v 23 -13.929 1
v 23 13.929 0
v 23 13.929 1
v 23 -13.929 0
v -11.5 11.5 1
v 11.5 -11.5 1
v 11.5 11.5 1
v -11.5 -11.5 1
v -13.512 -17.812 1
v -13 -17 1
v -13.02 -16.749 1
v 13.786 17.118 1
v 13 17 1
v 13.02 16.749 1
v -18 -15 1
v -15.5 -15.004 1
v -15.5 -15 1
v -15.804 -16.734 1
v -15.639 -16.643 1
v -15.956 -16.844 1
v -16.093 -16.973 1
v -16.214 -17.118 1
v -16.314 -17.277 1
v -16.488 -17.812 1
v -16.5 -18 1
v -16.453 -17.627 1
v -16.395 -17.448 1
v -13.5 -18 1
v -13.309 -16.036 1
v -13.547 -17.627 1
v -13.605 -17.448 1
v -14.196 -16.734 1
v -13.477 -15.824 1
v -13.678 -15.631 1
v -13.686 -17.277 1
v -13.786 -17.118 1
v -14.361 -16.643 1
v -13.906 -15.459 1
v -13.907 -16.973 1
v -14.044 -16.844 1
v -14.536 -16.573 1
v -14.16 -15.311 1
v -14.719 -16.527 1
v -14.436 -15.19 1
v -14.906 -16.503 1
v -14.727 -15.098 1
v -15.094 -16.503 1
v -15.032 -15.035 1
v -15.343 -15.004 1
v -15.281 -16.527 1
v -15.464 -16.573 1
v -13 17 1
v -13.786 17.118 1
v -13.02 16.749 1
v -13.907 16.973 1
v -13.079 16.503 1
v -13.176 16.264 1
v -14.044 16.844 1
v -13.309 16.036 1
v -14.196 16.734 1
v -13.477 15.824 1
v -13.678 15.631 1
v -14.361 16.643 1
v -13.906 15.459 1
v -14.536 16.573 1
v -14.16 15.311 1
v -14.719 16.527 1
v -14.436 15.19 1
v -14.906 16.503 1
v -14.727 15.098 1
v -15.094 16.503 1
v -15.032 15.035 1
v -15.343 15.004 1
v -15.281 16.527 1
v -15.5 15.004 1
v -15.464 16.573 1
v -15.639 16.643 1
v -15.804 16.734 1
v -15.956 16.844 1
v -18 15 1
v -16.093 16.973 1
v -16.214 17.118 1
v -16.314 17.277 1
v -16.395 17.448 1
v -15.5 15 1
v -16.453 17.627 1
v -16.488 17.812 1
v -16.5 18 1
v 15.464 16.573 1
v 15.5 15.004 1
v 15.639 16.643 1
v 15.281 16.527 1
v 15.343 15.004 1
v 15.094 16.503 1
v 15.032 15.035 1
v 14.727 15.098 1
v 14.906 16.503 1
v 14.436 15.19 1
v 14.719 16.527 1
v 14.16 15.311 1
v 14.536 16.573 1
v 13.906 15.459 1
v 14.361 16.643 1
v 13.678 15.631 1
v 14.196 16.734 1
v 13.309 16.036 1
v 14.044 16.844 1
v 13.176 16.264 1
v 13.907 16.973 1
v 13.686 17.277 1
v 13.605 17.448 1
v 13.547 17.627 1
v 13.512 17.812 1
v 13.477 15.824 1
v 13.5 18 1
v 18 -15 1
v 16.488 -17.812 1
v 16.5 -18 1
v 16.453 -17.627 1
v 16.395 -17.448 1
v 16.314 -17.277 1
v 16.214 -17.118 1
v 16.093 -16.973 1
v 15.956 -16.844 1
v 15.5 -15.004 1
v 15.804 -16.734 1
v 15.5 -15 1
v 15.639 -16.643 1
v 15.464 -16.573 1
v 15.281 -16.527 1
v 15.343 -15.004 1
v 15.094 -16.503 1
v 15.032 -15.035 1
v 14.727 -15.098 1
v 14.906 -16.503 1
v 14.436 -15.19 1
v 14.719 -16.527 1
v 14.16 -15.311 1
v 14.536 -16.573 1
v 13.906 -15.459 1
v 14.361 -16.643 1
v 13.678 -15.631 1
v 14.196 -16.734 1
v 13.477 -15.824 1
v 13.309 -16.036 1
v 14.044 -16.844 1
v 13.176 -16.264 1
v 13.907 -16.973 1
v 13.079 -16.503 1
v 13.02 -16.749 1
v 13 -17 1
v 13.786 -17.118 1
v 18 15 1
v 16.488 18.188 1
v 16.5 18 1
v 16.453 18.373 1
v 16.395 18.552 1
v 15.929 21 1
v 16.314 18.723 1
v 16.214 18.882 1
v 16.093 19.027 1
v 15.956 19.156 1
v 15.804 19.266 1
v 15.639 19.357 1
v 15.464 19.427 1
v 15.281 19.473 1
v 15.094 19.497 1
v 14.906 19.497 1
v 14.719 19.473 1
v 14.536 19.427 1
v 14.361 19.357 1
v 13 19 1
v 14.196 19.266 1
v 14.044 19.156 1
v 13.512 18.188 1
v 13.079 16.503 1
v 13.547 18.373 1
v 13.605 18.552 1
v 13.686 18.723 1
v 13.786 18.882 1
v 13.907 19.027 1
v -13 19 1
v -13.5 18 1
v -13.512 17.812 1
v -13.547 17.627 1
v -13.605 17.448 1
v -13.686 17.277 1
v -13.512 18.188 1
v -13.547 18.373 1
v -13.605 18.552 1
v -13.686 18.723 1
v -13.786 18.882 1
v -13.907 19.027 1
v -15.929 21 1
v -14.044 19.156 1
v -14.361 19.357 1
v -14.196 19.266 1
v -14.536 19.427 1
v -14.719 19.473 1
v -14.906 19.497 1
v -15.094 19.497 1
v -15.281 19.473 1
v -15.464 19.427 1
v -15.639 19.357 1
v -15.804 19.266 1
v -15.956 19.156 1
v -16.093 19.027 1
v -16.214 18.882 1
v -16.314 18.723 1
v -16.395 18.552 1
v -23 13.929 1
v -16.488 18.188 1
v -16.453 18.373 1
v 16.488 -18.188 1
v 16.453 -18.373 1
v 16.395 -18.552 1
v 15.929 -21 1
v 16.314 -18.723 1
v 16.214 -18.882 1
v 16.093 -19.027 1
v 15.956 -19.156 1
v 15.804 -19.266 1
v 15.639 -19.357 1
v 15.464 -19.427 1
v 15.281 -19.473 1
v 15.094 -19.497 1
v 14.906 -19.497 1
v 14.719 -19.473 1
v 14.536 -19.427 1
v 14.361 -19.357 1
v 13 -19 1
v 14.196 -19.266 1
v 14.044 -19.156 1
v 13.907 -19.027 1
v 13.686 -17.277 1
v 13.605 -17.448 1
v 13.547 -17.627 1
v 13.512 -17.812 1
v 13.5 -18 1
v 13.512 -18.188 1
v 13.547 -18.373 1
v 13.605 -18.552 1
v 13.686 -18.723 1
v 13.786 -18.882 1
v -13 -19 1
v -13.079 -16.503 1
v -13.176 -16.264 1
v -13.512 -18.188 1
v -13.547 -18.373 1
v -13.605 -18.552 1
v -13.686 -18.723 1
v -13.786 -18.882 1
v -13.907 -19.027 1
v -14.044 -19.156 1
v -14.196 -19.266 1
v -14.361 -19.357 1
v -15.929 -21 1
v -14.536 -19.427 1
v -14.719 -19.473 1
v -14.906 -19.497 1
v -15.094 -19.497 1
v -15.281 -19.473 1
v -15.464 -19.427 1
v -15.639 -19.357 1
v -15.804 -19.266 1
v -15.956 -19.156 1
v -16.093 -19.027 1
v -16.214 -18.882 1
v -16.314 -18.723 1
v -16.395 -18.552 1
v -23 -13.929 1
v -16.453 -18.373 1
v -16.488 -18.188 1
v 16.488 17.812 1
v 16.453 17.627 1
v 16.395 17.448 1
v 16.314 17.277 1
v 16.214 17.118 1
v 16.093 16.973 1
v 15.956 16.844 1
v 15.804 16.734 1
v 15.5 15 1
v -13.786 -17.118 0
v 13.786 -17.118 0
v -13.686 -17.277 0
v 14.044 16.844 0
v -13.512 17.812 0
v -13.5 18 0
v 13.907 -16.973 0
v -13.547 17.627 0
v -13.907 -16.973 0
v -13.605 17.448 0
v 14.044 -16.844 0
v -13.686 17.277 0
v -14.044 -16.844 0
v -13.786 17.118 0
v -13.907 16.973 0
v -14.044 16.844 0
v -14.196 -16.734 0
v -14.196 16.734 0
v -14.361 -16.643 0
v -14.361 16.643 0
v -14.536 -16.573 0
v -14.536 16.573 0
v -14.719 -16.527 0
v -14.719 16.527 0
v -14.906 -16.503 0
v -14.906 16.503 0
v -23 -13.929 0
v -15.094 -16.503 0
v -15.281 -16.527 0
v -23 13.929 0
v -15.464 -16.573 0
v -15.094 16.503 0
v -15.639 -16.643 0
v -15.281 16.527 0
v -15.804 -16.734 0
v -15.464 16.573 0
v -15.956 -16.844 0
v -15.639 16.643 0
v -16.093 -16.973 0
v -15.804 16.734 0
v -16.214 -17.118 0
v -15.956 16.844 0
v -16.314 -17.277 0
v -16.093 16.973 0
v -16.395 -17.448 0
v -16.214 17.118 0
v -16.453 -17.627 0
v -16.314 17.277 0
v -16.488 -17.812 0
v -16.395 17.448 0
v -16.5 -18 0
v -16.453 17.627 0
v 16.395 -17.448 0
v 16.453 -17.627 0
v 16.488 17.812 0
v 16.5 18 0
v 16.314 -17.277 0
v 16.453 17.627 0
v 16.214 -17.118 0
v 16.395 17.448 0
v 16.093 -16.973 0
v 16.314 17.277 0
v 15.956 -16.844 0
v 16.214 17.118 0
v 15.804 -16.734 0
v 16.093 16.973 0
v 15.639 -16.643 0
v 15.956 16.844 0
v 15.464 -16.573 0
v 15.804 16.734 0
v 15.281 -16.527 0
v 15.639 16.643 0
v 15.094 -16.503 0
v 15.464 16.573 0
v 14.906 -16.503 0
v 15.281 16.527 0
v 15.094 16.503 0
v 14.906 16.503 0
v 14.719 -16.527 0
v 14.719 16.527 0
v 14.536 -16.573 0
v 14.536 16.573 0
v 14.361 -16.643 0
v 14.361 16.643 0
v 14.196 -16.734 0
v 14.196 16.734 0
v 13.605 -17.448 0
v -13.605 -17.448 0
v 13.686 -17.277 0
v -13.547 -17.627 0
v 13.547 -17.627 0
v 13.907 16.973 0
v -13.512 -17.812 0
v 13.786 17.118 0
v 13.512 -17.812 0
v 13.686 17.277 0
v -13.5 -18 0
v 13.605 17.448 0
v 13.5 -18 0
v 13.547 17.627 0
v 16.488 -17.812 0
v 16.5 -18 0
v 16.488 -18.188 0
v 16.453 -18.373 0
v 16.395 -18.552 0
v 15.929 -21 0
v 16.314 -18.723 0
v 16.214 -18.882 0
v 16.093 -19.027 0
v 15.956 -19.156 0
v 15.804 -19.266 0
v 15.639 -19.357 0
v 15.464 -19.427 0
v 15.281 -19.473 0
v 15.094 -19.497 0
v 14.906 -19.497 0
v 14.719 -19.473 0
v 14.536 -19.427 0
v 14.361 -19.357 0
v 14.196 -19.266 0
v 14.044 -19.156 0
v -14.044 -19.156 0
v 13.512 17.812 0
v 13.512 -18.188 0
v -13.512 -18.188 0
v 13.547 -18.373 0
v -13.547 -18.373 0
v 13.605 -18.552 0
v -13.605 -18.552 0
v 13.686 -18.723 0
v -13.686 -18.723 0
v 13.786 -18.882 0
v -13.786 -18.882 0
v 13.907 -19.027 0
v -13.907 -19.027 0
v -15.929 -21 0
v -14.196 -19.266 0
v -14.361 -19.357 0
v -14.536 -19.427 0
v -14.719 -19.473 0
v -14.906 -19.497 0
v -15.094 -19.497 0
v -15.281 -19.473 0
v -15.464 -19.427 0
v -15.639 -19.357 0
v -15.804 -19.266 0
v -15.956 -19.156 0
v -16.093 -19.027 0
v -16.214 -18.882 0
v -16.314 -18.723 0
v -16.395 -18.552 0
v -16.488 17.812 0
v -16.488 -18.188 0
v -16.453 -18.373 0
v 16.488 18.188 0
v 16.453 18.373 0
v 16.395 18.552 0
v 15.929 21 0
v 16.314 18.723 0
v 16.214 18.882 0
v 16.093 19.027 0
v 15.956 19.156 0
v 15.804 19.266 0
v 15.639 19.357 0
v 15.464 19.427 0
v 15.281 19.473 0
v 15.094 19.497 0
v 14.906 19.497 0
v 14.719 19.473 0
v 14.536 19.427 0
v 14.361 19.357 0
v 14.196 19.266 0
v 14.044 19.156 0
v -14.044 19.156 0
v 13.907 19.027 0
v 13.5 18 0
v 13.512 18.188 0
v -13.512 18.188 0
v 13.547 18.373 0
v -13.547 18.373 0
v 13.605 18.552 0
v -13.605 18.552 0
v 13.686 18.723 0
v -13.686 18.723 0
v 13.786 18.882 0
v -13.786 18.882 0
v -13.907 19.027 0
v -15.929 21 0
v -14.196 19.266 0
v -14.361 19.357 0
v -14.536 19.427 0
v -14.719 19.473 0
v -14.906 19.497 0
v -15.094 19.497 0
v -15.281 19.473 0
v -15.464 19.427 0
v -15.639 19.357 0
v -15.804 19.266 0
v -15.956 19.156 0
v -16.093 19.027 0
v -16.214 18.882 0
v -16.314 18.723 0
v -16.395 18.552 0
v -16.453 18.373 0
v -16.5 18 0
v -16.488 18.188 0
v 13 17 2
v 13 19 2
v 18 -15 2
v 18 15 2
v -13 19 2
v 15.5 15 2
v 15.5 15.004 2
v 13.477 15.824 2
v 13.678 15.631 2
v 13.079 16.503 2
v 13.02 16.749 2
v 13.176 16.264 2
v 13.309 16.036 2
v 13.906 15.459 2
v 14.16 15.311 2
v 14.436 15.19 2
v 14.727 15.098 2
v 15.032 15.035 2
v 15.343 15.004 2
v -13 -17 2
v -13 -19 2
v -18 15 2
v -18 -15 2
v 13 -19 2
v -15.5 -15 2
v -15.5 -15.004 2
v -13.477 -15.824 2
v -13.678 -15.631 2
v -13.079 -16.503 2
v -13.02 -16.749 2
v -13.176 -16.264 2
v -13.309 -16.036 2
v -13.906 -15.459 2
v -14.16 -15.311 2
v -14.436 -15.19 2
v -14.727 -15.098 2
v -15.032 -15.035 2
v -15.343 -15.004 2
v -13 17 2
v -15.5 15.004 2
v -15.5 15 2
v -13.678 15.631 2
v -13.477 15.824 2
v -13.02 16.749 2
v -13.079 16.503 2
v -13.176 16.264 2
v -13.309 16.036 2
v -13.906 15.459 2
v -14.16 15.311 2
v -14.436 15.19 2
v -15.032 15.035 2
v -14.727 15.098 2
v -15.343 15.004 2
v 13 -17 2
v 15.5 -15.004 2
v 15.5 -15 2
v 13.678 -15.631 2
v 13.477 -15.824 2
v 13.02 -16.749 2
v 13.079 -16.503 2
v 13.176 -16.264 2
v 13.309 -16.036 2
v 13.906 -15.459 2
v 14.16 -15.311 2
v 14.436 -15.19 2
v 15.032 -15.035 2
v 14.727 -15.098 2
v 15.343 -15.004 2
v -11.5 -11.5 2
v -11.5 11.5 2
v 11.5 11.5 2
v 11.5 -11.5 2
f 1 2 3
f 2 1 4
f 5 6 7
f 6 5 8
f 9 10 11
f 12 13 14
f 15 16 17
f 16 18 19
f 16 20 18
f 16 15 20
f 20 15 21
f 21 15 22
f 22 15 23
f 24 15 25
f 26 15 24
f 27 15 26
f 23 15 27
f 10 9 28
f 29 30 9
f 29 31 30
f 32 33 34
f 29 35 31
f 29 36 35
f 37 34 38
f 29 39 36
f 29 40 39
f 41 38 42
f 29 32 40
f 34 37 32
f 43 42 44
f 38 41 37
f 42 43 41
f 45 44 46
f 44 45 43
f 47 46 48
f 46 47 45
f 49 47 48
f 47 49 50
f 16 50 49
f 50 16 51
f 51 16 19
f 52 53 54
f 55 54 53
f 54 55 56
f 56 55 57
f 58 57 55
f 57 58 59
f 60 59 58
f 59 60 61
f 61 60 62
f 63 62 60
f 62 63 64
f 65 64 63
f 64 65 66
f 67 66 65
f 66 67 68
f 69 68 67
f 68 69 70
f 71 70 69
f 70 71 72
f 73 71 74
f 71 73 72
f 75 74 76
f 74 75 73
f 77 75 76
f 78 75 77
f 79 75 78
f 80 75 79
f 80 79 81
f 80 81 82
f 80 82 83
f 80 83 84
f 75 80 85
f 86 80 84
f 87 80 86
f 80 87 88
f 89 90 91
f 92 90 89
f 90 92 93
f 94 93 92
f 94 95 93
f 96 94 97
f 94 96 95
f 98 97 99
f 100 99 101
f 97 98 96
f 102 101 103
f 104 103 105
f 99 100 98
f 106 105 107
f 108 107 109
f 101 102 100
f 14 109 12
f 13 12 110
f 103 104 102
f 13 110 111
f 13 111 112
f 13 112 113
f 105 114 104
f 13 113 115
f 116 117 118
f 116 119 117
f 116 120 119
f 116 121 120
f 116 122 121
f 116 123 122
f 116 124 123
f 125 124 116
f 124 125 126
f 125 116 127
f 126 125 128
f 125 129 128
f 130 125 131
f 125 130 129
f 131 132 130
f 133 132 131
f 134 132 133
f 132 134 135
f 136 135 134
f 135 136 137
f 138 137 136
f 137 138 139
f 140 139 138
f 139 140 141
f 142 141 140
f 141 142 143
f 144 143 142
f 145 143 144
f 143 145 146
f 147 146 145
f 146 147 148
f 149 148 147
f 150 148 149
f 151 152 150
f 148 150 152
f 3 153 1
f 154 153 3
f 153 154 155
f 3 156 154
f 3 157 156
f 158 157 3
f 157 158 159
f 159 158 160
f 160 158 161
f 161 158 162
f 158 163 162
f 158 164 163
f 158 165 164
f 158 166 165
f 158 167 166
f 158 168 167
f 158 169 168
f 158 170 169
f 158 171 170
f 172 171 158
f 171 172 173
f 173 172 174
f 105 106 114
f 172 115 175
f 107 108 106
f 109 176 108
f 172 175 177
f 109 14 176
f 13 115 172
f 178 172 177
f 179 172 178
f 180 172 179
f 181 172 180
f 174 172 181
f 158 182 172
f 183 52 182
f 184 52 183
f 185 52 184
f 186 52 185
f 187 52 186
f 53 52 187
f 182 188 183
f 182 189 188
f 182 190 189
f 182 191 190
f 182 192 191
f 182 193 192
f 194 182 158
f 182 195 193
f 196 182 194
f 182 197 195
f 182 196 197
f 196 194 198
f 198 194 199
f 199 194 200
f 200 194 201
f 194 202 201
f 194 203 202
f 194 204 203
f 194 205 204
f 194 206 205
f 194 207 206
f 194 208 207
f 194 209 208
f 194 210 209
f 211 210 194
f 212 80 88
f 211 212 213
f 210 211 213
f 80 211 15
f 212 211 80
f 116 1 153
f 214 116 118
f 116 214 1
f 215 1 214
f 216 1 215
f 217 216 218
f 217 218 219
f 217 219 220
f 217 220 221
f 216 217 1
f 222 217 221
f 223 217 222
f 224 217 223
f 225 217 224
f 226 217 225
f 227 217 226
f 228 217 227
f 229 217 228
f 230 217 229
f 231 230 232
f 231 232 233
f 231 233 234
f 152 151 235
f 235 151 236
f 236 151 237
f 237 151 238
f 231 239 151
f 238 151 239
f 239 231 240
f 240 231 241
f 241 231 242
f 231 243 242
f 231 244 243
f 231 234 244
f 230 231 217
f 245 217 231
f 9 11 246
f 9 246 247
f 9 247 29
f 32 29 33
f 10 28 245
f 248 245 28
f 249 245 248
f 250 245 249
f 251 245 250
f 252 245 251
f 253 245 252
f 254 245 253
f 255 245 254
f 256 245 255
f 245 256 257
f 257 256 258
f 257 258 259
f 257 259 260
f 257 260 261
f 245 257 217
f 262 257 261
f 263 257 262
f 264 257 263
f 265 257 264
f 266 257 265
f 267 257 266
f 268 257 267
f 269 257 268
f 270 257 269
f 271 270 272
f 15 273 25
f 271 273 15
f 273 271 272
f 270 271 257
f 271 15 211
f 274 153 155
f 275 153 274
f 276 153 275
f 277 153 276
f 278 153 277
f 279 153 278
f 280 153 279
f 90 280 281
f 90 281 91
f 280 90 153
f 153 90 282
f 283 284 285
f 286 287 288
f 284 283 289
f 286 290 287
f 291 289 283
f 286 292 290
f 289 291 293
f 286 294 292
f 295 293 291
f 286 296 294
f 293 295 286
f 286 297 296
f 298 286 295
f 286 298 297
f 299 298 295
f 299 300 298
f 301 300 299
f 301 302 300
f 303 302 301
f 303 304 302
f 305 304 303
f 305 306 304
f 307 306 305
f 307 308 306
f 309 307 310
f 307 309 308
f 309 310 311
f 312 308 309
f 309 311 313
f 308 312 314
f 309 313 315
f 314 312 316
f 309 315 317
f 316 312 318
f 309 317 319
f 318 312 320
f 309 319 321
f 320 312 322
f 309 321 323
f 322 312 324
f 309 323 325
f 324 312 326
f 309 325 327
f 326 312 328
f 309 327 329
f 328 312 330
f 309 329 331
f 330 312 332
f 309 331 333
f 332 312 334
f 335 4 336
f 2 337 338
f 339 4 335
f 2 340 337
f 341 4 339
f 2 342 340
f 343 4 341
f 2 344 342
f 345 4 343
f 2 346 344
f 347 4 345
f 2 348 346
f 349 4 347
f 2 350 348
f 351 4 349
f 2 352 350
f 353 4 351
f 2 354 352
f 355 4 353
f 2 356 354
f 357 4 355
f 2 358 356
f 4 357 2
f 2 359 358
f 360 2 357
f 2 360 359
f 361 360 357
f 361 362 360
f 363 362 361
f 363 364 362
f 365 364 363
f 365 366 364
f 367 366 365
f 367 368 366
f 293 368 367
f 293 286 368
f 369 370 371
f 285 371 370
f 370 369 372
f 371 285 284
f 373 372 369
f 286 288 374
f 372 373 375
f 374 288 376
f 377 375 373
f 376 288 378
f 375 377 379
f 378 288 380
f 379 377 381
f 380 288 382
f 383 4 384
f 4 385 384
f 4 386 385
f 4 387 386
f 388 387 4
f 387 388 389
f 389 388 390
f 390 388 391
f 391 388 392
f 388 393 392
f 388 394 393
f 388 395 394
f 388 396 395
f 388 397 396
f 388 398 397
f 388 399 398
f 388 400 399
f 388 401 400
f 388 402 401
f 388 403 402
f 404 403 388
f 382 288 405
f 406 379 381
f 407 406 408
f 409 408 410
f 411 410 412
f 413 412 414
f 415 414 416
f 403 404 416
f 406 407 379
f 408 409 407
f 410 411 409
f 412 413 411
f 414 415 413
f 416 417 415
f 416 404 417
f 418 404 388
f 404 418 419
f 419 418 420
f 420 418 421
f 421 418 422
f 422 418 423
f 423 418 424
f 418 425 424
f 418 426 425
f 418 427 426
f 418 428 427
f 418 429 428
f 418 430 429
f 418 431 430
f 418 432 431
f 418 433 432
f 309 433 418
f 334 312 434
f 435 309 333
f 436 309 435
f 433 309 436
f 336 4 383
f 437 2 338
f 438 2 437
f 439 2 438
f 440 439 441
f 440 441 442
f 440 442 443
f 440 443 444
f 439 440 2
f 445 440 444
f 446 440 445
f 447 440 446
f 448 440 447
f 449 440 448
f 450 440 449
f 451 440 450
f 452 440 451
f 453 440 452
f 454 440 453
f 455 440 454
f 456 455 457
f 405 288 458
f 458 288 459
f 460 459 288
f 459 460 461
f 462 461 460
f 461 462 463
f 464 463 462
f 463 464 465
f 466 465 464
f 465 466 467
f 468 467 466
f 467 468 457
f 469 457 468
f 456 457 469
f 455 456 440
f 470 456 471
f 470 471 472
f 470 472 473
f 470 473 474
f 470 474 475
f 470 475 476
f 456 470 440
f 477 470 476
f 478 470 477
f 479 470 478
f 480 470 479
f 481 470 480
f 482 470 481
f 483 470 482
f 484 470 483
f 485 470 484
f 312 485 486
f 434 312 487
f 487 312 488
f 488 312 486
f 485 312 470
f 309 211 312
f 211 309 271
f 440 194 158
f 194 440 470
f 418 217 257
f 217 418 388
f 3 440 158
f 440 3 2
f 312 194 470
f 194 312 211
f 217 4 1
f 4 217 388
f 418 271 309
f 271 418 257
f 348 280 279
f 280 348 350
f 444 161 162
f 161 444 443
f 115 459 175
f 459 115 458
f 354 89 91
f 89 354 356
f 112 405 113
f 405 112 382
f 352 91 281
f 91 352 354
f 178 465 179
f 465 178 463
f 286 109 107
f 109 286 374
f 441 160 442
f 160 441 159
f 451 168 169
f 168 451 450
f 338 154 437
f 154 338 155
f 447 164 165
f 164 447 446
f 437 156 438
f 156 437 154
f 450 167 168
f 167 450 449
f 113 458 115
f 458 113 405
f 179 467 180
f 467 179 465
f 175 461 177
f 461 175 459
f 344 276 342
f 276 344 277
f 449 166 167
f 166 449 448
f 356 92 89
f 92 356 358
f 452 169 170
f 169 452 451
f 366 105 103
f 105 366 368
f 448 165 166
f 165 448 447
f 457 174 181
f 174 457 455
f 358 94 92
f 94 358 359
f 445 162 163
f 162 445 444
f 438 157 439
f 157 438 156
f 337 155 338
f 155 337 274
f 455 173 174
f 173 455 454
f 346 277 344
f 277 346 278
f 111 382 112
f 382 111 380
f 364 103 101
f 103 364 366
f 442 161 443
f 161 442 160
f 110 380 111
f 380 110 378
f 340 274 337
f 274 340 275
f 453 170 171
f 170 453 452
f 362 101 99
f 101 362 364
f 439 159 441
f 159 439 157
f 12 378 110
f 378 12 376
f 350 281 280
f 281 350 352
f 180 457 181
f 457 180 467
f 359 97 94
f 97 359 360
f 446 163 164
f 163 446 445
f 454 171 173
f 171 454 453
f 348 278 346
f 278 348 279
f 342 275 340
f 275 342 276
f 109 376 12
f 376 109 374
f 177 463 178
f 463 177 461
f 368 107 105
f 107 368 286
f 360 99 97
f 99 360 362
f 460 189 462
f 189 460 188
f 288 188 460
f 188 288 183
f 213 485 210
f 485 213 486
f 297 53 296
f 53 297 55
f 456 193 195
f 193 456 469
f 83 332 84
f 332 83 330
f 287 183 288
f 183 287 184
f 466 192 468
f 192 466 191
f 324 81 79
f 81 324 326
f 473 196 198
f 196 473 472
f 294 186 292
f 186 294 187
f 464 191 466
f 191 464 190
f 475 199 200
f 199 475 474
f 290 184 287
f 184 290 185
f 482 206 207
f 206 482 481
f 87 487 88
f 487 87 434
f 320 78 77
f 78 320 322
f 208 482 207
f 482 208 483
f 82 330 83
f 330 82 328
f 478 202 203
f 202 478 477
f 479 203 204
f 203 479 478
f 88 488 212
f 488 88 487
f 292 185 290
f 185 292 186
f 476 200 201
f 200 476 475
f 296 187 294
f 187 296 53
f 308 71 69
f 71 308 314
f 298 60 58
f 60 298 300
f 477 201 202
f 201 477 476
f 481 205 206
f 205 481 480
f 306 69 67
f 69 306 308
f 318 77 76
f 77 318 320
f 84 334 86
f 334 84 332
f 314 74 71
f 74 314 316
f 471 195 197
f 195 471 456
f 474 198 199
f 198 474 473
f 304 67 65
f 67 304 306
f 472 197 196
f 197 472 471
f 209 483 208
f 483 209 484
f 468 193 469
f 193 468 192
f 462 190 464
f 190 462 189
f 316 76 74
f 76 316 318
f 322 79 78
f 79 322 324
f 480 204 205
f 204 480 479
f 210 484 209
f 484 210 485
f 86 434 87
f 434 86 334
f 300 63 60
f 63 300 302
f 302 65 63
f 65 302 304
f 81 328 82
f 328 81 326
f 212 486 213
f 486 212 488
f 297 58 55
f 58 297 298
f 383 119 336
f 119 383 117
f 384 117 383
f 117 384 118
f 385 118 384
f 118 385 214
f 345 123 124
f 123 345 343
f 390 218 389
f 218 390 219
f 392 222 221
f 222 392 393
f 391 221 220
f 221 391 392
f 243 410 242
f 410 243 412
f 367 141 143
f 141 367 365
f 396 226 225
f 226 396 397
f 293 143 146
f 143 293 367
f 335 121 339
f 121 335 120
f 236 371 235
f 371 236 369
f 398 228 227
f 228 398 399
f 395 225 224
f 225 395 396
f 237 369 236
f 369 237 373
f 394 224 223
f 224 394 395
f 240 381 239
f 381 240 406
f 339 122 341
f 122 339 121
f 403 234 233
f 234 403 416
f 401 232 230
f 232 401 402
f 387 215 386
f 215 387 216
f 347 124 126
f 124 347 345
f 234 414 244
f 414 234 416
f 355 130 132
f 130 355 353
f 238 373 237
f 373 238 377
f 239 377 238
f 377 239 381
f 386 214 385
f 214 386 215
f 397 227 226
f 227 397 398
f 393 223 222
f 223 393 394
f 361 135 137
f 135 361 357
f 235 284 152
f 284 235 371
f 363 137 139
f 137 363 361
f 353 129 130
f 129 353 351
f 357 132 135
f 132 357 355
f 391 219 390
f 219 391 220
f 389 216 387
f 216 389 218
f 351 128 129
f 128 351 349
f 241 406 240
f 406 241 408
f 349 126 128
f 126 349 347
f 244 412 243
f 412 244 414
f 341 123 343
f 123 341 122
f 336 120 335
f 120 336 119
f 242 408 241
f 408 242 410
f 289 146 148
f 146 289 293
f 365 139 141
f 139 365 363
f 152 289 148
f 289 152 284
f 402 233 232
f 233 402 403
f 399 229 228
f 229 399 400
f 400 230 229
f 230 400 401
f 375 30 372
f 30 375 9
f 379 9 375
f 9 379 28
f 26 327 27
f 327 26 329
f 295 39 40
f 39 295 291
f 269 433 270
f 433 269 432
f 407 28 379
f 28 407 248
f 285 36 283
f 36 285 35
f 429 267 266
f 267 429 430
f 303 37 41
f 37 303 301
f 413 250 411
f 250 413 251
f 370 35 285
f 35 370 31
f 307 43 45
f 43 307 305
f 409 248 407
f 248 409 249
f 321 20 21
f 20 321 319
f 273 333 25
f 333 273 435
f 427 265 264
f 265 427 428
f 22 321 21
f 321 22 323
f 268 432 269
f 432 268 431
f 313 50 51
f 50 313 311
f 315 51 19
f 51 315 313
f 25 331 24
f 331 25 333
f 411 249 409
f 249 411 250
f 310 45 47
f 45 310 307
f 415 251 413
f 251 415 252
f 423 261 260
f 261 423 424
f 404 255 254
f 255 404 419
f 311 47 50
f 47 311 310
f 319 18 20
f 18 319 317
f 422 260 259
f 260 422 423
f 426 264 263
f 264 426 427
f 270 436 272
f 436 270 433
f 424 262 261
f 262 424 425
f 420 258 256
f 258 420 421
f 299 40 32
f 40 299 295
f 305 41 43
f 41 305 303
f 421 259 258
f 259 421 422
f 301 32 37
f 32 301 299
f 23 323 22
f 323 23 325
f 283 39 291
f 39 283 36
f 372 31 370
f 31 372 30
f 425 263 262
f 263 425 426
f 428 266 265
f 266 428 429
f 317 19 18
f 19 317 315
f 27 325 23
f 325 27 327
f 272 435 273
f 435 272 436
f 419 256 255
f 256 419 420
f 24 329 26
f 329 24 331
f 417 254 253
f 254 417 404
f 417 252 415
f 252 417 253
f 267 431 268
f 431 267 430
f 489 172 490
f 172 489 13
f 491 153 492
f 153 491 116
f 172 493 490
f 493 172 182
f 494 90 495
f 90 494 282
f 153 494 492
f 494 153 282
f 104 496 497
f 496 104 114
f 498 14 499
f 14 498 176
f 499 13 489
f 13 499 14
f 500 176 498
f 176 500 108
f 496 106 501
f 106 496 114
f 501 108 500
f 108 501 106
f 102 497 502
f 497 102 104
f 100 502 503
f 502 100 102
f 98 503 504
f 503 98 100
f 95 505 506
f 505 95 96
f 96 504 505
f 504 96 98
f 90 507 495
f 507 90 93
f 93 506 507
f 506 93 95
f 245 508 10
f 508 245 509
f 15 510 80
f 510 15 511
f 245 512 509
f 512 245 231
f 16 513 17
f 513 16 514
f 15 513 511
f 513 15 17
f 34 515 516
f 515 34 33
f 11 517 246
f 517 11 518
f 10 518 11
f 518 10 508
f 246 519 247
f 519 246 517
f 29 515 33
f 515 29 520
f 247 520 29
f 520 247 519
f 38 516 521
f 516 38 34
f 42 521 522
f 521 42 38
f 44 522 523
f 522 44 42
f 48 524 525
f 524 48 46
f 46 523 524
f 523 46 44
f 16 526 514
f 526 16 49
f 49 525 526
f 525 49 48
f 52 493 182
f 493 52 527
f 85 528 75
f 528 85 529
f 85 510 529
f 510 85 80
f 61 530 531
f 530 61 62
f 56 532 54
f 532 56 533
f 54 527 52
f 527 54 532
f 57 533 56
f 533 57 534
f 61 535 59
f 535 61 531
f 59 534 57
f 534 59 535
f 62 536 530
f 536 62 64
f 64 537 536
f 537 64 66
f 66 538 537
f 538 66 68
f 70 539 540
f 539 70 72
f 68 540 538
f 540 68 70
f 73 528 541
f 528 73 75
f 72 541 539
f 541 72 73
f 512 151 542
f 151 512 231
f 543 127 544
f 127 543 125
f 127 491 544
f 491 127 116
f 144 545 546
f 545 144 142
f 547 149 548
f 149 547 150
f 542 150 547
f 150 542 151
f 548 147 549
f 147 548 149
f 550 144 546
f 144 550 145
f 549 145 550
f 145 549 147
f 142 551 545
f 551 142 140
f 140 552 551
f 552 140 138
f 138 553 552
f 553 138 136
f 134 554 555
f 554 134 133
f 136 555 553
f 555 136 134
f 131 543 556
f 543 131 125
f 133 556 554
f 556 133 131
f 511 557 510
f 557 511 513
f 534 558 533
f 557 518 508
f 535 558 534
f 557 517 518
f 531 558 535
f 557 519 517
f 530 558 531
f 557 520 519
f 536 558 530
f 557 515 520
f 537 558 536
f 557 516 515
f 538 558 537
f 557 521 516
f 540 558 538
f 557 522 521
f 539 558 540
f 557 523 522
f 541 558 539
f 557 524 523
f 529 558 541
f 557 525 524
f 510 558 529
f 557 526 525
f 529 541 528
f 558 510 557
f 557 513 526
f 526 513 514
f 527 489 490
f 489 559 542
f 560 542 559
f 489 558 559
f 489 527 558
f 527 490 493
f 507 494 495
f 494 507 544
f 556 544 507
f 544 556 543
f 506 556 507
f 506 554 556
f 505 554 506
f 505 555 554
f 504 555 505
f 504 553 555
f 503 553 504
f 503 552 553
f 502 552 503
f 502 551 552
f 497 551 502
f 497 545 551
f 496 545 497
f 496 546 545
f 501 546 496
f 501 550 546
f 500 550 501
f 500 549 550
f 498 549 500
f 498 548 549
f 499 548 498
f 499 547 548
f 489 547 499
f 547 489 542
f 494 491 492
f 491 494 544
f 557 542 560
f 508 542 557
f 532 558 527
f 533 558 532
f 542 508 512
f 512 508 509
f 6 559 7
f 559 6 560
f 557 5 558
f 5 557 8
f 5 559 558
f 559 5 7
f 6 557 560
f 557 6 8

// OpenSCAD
$fn = 50;

module aluminum_base_plate()
{
	width = 46;
	height = 42;
	thickness = 1;
	hole_distance_x = 30;
	hole_distance_y = 36;
	hole_radius = 1.5;

	module diagonal_corner()
	{
		rotate(45) cube([10,10,thickness+0.1], center=true);
	}

	module screw_hole()
	{
		cylinder(r=hole_radius, h=thickness+0.1, center=true);
	}

	color("lightgrey")
	{
		translate([0,0,thickness/2]) difference()
		{
			cube([width,height,thickness], center=true);

			// 4 corners
			translate([width/2,height/2]) diagonal_corner();
			translate([-width/2,height/2]) diagonal_corner();
			translate([width/2,-height/2]) diagonal_corner();
			translate([-width/2,-height/2]) diagonal_corner();

			// screw holes
			translate([hole_distance_x/2,hole_distance_y/2]) screw_hole();
			translate([-hole_distance_x/2,hole_distance_y/2]) screw_hole();
			translate([hole_distance_x/2,-hole_distance_y/2]) screw_hole();
			translate([-hole_distance_x/2,-hole_distance_y/2]) screw_hole();
		}
	}
}

module plastic_casing()
{
	width = 36;
	height = 38;
	thickness = 1;
	hole_width = 23;
	hole_height = 23;

	module round_corner()
	{
    	w = 5;
		h = 4;
		union()
		{
			translate([0,0,-0.1])
			{
				cube([w,h/2,thickness+0.2]);
				cube([w/2,h,thickness+0.2]);
				translate([w/2,h/2,0]) scale([w/2,h/2]) cylinder(r=1, h=thickness+0.2);
			}
		}
	}

	color("white")
	{
		difference()
		{
			translate([-width/2,-height/2]) cube([width,height,thickness]);

			// 4 corners
			translate([width/2,height/2]) rotate(180) round_corner();
			translate([-width/2,-height/2]) round_corner();
			mirror([1,0,0])
			{
			translate([width/2,height/2]) rotate(180) round_corner();
			translate([-width/2,-height/2]) round_corner();
			}

			// hallow middle
			translate([-hole_width/2,-hole_height/2,-0.1]) cube([hole_width,hole_height,thickness+0.2]);
		}
	}
}

aluminum_base_plate();
translate([0,0,1]) plastic_casing();
